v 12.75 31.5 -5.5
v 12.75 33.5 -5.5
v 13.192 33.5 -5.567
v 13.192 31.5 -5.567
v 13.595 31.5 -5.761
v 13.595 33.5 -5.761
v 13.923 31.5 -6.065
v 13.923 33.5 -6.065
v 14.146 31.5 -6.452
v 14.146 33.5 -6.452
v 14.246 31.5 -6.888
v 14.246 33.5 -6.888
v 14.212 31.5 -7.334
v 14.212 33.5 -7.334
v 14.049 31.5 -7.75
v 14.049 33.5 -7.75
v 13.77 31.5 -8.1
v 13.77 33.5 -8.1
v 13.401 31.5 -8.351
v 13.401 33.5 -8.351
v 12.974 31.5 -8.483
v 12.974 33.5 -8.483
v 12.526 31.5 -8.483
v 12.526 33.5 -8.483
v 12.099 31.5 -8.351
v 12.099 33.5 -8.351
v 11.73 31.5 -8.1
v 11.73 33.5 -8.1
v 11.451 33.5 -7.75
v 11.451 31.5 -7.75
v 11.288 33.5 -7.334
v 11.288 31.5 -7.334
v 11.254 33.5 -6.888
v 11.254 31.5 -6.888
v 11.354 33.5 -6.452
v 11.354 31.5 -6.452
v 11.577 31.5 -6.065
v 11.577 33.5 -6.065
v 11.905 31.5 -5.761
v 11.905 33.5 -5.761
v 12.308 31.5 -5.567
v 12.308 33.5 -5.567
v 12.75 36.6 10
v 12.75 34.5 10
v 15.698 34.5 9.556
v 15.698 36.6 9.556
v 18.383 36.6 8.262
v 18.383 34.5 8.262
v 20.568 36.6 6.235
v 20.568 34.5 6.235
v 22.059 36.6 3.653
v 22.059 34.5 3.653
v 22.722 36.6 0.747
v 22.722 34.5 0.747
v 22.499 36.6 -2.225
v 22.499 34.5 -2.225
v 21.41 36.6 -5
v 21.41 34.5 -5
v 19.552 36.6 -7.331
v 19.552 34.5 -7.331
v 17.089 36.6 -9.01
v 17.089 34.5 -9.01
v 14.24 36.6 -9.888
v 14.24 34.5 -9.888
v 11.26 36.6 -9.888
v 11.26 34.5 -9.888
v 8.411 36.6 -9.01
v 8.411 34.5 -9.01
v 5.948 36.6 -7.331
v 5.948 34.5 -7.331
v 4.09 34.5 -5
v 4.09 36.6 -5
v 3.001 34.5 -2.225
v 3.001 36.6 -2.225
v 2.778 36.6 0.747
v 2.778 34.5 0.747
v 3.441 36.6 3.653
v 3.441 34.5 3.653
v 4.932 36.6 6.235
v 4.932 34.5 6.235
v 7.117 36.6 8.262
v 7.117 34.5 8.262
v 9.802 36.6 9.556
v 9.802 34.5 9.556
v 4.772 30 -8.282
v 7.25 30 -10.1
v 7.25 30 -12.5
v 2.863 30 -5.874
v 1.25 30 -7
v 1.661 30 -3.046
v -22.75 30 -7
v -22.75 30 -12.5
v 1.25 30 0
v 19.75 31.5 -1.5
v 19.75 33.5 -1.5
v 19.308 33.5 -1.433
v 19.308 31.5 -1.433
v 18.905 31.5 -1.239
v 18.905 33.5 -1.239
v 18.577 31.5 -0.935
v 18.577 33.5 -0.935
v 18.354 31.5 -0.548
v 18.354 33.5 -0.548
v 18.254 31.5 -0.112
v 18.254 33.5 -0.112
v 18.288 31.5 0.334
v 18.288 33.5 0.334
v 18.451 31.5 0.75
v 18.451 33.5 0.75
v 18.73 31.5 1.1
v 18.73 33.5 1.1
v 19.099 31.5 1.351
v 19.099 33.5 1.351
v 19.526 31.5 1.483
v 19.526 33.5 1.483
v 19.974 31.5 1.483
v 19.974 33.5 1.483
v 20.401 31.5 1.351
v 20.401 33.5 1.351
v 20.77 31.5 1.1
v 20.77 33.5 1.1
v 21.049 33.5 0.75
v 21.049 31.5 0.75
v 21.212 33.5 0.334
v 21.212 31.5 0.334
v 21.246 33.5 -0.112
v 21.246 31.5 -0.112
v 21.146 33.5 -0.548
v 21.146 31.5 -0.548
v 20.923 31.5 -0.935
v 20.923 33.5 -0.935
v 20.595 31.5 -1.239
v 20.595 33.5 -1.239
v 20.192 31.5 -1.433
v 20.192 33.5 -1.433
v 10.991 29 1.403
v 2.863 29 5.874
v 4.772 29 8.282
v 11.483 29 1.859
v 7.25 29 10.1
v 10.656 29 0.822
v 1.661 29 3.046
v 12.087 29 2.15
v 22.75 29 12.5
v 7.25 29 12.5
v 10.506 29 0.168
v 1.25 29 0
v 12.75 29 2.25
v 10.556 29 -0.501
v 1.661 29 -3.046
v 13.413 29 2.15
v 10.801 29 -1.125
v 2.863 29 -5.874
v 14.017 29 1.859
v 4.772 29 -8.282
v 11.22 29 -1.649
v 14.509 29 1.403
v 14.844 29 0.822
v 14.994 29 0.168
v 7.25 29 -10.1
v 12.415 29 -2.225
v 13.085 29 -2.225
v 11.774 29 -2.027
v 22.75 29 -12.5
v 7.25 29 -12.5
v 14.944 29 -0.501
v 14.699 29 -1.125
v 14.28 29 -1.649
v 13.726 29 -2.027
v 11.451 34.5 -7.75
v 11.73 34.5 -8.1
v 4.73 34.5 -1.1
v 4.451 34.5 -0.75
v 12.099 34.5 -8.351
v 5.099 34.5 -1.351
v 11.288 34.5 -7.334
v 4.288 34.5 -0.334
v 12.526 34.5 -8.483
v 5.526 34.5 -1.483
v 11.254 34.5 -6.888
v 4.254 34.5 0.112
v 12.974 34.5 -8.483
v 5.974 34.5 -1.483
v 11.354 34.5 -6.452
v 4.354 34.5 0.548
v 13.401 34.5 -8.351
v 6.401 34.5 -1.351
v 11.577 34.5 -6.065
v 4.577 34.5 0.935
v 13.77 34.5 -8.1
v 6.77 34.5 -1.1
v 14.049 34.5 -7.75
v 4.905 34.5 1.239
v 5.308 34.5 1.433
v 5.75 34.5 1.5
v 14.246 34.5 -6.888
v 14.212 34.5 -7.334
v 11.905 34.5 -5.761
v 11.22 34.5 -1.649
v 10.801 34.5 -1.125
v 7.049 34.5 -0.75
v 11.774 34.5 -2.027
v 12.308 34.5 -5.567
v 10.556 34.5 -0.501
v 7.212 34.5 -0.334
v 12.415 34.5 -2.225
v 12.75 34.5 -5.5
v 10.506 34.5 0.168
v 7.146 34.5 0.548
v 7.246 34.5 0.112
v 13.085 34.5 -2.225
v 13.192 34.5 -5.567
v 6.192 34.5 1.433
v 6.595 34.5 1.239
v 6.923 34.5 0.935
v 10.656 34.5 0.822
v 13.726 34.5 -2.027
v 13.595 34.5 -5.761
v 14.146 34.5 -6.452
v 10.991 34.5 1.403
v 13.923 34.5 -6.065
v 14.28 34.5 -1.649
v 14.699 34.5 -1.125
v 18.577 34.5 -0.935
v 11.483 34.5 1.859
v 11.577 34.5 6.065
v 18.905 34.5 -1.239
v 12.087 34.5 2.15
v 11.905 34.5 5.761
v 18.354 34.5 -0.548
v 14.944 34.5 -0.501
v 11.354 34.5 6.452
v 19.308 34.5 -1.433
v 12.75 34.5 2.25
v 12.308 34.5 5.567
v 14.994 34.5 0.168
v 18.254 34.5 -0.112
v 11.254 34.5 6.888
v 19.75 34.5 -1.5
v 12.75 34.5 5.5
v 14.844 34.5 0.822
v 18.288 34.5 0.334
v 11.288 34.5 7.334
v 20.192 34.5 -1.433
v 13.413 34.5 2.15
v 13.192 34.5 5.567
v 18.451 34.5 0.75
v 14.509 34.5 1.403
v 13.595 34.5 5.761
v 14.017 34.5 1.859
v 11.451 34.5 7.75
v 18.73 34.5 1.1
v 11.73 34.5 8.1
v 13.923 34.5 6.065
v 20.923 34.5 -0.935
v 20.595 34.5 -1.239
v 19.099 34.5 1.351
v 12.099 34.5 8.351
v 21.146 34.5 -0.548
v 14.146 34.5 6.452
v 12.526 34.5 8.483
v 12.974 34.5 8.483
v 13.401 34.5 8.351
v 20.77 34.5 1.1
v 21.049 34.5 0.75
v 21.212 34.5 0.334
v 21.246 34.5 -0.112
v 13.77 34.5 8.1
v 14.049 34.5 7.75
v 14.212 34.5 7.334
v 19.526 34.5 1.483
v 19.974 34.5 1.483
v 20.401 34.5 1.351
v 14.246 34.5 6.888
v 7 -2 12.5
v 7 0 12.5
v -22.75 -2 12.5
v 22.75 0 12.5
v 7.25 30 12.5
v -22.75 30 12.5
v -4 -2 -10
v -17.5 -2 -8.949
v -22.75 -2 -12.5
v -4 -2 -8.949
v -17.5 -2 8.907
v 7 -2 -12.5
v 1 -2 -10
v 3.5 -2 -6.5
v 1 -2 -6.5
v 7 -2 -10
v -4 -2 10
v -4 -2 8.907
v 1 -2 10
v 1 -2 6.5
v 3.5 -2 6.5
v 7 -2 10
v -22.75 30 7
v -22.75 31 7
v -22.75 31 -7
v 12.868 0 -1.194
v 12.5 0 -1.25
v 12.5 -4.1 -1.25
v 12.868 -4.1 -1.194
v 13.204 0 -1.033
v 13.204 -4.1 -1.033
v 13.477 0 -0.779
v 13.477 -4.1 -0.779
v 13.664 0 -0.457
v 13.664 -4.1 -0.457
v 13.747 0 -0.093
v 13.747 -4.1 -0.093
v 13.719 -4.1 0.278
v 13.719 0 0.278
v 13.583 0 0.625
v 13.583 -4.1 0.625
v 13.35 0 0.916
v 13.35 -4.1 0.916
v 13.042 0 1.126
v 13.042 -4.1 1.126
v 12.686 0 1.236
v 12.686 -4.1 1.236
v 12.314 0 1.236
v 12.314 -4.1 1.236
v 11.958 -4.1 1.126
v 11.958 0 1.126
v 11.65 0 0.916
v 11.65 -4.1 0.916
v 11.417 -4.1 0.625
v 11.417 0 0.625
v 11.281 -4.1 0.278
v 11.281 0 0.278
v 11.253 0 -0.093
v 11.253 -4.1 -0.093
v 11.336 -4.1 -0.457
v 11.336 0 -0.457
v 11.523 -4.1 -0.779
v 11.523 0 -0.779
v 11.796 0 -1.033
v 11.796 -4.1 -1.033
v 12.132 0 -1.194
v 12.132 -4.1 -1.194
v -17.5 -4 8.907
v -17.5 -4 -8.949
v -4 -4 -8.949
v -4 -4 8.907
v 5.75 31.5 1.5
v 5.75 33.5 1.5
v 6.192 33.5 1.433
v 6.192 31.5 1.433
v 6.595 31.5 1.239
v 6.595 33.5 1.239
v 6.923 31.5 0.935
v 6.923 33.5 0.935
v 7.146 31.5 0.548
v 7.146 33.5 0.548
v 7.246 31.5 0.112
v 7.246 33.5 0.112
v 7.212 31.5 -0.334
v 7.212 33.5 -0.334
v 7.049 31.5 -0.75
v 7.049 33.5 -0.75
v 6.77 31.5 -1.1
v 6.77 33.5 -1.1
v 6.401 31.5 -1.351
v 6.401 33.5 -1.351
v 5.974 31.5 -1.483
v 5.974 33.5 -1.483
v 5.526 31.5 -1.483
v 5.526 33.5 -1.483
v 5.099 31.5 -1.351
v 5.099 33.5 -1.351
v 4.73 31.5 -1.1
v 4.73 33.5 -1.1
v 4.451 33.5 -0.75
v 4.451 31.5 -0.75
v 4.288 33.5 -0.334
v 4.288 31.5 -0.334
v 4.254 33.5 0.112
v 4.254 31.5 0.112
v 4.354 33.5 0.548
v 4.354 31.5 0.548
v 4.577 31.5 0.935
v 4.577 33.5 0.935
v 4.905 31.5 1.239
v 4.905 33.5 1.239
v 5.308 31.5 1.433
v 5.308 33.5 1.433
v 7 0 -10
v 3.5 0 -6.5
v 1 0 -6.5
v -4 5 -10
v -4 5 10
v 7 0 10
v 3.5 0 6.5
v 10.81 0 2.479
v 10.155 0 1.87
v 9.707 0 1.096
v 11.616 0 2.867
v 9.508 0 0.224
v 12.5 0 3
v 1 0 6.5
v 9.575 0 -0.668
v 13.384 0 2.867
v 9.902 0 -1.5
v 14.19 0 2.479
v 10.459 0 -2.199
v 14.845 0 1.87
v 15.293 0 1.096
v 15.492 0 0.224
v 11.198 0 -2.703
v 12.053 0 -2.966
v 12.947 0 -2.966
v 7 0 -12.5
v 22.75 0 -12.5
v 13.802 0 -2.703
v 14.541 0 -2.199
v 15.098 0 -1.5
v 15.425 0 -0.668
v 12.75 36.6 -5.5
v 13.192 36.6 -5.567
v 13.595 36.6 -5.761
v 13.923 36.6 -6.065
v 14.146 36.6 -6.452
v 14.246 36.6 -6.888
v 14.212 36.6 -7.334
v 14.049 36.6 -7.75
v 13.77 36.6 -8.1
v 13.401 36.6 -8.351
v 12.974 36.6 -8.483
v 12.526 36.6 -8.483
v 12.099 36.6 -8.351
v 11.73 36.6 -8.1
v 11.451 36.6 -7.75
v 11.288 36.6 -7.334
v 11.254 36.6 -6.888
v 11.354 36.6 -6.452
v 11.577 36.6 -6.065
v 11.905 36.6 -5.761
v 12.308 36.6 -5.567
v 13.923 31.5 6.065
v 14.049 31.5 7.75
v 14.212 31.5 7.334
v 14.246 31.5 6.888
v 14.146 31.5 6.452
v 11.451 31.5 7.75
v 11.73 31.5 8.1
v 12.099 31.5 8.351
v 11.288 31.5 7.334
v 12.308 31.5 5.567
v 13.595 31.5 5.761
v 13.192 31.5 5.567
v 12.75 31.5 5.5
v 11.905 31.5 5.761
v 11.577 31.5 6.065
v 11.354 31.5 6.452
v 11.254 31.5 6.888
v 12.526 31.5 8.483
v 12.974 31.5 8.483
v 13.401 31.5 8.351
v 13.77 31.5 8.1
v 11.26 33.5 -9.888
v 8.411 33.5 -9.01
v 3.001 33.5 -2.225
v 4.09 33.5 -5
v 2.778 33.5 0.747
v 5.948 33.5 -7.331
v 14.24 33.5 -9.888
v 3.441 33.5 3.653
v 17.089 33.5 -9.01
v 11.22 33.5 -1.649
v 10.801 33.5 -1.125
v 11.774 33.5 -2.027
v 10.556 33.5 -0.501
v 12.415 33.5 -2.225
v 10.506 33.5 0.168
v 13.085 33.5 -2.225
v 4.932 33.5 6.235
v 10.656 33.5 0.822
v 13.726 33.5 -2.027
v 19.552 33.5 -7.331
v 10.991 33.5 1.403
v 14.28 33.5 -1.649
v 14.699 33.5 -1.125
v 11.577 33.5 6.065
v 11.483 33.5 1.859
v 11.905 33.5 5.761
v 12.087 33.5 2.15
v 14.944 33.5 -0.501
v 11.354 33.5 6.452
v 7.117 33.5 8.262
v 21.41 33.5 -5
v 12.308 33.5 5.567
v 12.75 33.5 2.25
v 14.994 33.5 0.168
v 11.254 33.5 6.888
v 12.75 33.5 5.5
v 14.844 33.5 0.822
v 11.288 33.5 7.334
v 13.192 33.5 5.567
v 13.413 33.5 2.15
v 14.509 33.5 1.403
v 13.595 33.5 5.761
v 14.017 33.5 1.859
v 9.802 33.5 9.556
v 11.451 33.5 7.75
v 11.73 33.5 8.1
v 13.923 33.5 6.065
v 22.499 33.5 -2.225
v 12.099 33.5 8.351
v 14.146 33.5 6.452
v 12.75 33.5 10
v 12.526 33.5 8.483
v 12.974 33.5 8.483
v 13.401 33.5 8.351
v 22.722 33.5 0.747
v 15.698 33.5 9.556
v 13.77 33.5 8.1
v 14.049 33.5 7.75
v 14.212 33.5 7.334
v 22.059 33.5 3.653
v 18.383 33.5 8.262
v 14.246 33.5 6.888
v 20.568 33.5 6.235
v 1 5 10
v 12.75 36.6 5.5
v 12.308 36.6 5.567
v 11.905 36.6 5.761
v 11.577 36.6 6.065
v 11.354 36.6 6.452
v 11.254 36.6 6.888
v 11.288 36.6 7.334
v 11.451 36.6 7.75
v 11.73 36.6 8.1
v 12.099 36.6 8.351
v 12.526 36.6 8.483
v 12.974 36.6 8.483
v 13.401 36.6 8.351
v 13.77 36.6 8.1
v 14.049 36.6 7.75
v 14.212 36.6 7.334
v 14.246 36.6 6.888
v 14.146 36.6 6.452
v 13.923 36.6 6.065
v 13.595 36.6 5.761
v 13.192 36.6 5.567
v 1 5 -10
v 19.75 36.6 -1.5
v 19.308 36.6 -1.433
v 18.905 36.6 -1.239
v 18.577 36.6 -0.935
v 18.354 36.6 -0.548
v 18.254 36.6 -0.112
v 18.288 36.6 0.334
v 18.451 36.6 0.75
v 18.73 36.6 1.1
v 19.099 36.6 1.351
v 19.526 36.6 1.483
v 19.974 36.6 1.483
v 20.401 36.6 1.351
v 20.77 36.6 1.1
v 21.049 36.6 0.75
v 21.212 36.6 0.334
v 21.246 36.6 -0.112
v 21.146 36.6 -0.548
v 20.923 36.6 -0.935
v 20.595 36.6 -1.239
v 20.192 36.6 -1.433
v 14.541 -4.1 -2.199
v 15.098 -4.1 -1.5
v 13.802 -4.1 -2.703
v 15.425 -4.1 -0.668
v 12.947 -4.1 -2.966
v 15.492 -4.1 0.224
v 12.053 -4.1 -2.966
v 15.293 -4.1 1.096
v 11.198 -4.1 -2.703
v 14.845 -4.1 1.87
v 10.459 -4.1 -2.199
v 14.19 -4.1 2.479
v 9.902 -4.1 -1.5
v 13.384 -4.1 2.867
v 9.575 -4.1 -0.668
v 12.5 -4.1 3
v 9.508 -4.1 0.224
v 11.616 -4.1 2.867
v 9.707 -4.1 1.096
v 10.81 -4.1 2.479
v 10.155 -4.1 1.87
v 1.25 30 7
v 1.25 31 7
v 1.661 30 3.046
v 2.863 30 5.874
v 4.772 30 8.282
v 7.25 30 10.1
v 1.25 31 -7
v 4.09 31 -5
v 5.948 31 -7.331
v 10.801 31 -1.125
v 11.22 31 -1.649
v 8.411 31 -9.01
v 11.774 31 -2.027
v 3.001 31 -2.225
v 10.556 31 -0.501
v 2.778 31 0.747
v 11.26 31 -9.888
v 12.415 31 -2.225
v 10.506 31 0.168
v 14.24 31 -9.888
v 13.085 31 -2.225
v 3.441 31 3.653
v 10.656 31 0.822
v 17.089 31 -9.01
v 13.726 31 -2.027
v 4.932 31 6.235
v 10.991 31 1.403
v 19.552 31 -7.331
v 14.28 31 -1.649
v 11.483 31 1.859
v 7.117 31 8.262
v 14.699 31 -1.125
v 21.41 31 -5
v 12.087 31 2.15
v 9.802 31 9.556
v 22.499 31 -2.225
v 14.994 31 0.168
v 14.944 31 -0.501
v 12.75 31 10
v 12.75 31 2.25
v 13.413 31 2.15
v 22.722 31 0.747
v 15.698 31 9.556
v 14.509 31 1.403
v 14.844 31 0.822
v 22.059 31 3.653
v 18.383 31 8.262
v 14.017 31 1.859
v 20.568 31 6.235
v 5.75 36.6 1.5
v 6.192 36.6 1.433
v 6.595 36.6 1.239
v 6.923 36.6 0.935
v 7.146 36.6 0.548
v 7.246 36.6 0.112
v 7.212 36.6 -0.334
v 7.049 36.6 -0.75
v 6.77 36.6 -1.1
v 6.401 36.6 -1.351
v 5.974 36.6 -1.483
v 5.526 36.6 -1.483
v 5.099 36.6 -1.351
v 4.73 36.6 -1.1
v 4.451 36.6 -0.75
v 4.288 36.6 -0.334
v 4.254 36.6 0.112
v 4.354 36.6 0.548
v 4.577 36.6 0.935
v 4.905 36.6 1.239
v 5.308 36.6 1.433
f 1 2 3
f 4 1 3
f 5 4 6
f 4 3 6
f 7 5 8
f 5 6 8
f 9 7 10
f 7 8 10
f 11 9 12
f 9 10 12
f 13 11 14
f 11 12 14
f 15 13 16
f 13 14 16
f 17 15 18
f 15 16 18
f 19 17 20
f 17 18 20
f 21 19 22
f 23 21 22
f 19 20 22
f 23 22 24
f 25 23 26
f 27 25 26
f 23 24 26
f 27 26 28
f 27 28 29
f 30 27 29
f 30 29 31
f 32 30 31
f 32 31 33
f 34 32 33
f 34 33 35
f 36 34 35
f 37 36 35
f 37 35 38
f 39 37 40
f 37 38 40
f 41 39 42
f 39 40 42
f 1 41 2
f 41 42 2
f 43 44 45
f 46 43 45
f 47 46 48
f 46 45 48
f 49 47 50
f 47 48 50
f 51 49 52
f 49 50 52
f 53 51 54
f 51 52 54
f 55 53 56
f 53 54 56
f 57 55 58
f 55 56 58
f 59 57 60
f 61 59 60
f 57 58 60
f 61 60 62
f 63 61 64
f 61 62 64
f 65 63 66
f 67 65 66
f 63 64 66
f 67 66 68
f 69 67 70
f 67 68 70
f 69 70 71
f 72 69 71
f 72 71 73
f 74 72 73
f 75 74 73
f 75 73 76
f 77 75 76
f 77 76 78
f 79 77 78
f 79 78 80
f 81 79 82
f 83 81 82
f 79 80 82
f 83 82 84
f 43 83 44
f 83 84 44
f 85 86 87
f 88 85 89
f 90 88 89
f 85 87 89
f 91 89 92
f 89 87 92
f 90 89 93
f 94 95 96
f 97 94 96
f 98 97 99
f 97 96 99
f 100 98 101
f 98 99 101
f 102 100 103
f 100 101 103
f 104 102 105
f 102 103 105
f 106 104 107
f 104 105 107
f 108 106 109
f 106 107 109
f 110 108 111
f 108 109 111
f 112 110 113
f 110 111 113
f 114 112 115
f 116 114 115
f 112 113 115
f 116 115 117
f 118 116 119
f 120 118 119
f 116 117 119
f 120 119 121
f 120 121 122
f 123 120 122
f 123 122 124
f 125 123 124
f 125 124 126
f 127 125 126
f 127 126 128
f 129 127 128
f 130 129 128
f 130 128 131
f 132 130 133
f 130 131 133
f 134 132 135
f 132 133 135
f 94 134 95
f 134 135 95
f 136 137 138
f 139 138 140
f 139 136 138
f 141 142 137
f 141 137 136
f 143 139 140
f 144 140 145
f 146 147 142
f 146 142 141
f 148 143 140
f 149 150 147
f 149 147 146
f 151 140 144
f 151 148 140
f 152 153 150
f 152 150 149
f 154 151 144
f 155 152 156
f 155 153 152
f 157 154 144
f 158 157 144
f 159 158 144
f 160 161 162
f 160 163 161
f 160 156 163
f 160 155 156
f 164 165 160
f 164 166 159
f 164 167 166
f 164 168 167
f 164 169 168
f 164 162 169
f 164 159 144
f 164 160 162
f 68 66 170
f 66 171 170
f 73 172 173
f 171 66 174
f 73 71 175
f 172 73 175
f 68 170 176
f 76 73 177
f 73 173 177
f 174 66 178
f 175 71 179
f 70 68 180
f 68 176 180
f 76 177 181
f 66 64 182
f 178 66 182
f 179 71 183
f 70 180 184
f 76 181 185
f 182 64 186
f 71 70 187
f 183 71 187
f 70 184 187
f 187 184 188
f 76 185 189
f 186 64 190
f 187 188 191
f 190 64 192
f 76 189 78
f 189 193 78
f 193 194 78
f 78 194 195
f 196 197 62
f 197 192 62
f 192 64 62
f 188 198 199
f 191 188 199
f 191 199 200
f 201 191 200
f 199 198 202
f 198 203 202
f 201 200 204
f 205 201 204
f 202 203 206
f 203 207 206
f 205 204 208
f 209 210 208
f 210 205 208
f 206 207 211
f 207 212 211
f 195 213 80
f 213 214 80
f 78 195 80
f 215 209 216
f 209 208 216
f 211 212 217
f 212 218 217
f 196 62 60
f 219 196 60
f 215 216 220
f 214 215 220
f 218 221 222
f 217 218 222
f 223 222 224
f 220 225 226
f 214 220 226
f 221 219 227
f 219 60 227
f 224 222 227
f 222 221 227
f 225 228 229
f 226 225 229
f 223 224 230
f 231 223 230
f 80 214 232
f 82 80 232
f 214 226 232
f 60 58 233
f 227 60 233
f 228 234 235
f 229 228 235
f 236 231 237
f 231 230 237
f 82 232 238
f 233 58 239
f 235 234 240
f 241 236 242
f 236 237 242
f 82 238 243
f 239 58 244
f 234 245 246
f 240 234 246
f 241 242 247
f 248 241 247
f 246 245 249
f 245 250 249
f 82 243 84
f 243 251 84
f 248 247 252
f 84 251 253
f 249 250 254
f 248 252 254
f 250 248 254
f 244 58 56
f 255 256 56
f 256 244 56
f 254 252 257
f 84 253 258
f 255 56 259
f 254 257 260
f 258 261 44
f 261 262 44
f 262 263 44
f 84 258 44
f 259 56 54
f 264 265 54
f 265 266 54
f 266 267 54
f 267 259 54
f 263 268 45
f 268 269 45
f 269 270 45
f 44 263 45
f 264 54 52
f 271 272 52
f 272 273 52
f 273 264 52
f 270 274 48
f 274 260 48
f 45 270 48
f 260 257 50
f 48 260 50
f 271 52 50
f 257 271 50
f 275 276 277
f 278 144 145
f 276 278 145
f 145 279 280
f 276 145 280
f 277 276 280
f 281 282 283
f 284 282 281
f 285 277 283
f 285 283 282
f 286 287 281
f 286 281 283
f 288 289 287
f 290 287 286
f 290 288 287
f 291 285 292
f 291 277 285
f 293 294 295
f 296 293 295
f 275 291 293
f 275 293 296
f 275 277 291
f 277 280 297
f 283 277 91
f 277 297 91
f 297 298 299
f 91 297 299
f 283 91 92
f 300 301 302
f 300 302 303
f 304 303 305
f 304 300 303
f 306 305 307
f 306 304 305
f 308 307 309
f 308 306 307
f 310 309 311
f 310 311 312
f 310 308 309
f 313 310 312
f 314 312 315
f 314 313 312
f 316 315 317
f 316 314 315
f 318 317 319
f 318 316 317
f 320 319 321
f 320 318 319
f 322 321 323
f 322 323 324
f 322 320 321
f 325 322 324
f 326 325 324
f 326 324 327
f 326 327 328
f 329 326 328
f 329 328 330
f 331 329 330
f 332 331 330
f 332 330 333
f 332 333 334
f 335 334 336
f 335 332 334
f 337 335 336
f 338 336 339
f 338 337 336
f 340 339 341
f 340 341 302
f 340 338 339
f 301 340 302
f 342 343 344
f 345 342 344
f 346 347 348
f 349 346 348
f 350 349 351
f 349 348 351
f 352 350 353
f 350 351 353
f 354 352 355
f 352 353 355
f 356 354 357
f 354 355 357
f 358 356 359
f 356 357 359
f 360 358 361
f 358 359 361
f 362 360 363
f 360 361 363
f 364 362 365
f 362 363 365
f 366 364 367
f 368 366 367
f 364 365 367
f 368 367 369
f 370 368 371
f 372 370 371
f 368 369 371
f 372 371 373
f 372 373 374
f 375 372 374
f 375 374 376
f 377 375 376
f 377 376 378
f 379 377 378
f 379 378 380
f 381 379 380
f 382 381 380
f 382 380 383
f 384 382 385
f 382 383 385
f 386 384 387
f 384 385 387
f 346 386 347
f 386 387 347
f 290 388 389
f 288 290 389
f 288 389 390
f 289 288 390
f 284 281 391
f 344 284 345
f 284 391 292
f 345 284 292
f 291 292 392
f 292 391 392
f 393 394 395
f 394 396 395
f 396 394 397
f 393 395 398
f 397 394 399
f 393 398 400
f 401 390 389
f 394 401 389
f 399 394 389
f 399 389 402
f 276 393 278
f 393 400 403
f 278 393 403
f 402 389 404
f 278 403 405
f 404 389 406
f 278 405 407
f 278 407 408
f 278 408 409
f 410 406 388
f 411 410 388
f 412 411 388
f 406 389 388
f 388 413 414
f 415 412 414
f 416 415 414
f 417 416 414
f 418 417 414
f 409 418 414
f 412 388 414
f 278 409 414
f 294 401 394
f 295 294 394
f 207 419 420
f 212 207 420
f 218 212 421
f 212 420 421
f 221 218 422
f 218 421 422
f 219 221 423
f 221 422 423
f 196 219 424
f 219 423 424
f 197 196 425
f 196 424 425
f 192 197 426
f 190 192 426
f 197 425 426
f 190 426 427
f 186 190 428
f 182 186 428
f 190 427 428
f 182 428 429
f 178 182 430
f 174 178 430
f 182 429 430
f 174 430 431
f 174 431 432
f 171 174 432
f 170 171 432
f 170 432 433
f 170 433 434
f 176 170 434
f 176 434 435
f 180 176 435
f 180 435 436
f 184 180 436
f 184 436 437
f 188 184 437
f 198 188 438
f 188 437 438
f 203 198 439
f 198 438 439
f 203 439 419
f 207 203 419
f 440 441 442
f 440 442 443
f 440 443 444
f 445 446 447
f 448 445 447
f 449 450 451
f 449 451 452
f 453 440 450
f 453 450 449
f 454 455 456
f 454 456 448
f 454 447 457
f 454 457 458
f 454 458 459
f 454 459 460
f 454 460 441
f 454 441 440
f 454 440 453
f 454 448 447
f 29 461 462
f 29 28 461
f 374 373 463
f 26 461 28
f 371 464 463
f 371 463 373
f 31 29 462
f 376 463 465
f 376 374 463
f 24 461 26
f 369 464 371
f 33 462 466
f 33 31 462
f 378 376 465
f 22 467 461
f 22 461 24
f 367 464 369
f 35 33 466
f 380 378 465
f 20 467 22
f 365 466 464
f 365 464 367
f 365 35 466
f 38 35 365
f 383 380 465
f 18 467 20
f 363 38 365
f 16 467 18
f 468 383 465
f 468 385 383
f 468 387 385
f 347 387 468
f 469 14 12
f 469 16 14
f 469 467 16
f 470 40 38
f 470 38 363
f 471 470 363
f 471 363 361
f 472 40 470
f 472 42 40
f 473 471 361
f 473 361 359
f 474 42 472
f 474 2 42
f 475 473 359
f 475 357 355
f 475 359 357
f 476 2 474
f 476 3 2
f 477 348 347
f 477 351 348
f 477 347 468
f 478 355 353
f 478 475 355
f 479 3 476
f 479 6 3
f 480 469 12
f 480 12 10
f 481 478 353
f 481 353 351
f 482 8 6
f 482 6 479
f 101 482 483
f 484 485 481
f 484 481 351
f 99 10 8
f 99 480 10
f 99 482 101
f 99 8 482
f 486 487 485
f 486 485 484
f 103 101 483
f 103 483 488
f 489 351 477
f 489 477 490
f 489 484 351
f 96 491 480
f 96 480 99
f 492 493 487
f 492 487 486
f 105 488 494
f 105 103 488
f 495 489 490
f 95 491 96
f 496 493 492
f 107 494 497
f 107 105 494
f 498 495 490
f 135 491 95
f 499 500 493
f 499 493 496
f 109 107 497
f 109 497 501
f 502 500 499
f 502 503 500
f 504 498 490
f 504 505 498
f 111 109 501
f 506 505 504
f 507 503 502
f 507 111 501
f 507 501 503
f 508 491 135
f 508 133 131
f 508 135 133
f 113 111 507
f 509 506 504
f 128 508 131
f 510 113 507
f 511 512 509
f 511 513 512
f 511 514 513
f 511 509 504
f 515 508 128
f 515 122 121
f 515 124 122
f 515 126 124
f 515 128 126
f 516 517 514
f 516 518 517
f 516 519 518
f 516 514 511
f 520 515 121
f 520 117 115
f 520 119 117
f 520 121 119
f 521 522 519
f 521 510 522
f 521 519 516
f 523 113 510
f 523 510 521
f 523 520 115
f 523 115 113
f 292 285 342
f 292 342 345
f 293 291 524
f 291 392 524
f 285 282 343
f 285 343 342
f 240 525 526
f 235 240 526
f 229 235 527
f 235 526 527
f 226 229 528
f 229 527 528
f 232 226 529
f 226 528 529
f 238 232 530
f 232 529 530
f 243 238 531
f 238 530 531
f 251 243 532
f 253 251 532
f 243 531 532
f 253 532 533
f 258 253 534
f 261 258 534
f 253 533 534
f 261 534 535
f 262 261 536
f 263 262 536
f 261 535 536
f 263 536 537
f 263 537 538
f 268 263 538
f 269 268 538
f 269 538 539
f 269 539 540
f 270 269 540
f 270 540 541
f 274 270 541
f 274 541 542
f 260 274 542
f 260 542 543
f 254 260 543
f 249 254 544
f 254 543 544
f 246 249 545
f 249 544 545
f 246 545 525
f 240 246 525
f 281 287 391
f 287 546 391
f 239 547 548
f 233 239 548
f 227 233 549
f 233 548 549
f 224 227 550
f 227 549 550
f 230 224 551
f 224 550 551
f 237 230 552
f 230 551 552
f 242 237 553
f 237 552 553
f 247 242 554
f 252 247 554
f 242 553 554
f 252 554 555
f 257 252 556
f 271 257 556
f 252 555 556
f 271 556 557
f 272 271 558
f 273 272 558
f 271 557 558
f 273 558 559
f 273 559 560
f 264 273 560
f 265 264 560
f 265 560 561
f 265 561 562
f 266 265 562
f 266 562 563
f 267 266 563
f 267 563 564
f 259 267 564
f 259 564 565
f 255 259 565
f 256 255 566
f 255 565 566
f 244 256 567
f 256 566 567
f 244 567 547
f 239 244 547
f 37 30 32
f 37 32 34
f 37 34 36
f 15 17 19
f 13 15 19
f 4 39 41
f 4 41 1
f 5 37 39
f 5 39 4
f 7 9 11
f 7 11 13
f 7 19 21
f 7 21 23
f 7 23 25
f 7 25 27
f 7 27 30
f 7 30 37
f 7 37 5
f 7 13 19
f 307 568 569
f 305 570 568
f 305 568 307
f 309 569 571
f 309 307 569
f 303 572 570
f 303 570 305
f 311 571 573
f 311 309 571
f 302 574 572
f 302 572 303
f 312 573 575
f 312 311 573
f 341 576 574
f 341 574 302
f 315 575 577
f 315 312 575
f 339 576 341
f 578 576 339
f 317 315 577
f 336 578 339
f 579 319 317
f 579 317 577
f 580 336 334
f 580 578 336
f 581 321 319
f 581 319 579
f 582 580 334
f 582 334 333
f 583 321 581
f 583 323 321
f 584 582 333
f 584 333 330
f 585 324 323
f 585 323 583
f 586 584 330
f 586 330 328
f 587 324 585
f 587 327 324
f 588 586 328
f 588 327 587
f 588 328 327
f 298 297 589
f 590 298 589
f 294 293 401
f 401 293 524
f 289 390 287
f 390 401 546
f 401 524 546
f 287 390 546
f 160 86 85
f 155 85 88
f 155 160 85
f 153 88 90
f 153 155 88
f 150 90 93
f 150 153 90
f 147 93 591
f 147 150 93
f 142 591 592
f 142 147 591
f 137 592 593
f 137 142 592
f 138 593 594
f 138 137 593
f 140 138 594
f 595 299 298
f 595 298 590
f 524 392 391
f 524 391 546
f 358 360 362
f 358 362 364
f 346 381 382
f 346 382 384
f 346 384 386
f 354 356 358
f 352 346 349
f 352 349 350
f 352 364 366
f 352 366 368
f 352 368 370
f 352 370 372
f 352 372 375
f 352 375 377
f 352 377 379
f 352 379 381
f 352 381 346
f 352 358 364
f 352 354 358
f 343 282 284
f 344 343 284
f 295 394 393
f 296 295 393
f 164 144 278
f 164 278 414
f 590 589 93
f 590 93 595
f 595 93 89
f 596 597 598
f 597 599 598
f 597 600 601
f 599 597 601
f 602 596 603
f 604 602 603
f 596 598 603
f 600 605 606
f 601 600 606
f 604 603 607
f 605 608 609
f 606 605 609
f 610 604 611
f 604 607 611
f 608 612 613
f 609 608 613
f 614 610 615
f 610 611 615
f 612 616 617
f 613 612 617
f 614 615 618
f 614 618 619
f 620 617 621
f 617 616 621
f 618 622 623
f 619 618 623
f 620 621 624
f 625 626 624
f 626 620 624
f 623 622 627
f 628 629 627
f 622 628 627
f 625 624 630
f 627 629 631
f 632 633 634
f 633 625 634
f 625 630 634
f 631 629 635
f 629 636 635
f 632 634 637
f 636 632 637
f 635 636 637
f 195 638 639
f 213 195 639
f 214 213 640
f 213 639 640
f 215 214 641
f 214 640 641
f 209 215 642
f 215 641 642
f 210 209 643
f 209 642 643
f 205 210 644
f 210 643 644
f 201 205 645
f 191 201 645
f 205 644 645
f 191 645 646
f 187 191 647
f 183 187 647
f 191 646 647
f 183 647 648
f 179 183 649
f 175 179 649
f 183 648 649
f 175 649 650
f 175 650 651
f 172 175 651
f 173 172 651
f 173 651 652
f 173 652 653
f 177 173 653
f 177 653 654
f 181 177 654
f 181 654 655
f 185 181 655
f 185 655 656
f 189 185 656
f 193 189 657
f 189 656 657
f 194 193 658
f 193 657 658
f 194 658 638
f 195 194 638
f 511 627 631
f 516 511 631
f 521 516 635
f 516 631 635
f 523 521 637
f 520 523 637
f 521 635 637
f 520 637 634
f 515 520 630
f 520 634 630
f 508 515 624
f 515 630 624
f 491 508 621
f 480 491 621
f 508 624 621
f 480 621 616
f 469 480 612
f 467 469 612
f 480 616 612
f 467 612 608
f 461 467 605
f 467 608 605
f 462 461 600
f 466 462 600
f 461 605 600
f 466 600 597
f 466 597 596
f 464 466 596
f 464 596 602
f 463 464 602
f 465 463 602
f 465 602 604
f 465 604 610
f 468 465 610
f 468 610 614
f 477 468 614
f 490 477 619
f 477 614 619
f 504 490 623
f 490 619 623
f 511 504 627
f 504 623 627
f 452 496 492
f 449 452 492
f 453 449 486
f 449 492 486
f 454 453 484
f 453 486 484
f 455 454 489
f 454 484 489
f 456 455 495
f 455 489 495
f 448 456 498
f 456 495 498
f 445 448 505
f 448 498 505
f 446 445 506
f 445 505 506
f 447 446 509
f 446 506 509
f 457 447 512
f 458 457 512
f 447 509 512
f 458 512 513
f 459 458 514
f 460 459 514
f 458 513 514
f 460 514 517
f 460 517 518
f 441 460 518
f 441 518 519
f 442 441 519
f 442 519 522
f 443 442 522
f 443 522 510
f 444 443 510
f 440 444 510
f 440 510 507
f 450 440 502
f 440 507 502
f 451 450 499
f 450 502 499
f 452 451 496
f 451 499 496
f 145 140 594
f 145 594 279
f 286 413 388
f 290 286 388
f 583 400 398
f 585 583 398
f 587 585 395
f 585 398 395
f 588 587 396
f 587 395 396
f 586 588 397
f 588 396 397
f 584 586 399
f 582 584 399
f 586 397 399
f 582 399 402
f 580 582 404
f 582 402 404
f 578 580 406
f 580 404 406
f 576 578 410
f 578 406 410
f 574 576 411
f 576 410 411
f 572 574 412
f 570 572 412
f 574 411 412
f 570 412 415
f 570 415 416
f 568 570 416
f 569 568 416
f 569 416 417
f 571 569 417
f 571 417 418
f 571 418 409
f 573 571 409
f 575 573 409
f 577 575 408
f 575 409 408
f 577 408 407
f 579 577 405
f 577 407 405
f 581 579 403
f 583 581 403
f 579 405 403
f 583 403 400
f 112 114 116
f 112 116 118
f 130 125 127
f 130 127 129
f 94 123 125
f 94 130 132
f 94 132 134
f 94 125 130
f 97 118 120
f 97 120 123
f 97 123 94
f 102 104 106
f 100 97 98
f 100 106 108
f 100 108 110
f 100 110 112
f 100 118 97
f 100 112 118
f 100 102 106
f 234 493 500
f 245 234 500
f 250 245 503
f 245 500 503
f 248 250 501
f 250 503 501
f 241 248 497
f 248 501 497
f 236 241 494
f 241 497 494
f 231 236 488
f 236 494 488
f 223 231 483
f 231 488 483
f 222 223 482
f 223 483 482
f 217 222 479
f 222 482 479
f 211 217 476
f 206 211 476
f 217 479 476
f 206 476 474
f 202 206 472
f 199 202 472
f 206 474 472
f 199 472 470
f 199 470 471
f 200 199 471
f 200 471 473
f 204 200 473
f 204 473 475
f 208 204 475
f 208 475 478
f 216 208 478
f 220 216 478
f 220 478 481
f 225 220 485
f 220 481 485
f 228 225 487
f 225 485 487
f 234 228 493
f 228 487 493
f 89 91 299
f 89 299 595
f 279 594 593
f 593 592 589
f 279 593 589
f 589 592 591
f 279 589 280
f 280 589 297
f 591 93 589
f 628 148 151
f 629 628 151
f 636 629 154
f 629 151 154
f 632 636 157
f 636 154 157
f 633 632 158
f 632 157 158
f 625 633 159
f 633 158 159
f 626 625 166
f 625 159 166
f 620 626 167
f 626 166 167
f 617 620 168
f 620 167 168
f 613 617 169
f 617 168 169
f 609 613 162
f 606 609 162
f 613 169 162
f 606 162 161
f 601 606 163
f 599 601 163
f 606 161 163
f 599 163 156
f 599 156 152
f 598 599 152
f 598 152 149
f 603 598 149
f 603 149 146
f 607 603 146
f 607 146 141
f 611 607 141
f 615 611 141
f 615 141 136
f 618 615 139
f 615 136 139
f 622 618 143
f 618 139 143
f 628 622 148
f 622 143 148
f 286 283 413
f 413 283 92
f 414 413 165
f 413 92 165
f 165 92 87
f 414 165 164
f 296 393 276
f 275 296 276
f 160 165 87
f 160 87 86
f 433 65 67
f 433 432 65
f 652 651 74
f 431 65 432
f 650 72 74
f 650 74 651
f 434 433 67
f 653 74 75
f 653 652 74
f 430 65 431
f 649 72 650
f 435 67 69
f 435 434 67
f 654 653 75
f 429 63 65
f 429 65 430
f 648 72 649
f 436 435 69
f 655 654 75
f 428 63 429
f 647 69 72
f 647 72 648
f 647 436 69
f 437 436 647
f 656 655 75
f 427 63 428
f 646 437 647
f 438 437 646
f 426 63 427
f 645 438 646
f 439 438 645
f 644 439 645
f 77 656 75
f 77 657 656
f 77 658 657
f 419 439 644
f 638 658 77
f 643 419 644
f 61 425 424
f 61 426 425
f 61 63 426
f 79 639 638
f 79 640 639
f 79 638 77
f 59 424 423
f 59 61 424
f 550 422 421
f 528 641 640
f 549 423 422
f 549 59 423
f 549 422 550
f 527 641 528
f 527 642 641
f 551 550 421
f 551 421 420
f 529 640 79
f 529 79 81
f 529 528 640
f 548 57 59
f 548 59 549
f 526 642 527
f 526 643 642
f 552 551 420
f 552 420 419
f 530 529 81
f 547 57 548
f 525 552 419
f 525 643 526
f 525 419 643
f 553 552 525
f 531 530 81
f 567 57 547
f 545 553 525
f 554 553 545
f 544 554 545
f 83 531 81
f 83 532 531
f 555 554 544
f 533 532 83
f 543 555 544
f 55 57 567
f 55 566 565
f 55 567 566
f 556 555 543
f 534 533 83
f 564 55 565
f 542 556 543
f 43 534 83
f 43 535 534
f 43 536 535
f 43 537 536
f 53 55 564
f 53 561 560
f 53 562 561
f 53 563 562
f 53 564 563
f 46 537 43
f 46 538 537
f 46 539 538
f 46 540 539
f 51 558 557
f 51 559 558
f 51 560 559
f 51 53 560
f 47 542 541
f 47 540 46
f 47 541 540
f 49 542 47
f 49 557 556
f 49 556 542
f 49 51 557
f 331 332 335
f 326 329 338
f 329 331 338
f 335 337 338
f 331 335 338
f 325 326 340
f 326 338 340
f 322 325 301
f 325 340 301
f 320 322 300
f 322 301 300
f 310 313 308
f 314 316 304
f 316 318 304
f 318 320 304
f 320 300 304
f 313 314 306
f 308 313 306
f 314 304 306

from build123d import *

# Parameters (mm, degrees)
MAIN_BODY_SKETCH_W        = 45.5
MAIN_BODY_SKETCH_H        = 25
MAIN_BODY_EXTRUSION_DEPTH = 29
BOSS_EXTRUDE3_DEPTH       = 1
SKETCH8_W                 = 24
SKETCH8_H                 = 14
BOSS_EXTRUDE8_DEPTH       = 1
SKETCH3_R                 = 2.25
BOSS_EXTRUDE4_DEPTH       = 2
SKETCH6_R                 = 10
BOSS_EXTRUDE7_DEPTH       = 2.5
SKETCH7_R                 = 1.5
CUT_EXTRUDE1_DEPTH        = 2
SKETCH10_R                = 2.25
BOSS_EXTRUDE12_DEPTH      = 1
SKETCH11_R                = 10
BOSS_EXTRUDE13_DEPTH      = 2.1
SKETCH13_R                = 1.5
CUT_EXTRUDE3_DEPTH        = 2.1
BOSS_EXTRUDE9_DEPTH       = 2
SKETCH9_W                 = 5
SKETCH9_H                 = 20
CUT_EXTRUDE2_DEPTH        = 5
SKETCH4_R                 = 3
SKETCH4_R_2               = 1.25
BOSS_EXTRUDE10_DEPTH      = 4.1
SKETCH14_W                = 13.5
SKETCH14_H                = 17.856103011
BOSS_EXTRUDE14_DEPTH      = 2


with BuildPart() as part:
    # Main Body Sketch → Main Body Extrusion (new body)
    with BuildSketch(Plane(origin=(0, 0, 0), x_dir=(1, 0, 0), z_dir=(0, 1, 0))):
        Rectangle(MAIN_BODY_SKETCH_W, MAIN_BODY_SKETCH_H)
    extrude(amount=MAIN_BODY_EXTRUSION_DEPTH)

    # Sketch2 → Boss-Extrude3 (add)
    with BuildSketch(Plane(origin=(0, 29, 0), x_dir=(1, 0, 0), z_dir=(0, 1, 0))):
        with BuildLine():
            Line((-22.75, 12.5), (7.25, 12.5))
            Line((7.25, 12.5), (7.25, 10.099504938))
            ThreePointArc((7.25, 10.099504938), (1.25, 0), (7.25, -10.099504938))
            Line((7.25, -10.099504938), (7.25, -12.5))
            Line((7.25, -12.5), (-22.75, -12.5))
            Line((-22.75, -12.5), (-22.75, 12.5))
        make_face()
    extrude(amount=BOSS_EXTRUDE3_DEPTH)

    # Sketch8 → Boss-Extrude8 (add)
    with BuildSketch(Plane(origin=(0, 30, 0), x_dir=(1, 0, 0), z_dir=(0, 1, 0))):
        with Locations((-10.75, 0)):
            Rectangle(SKETCH8_W, SKETCH8_H)
    extrude(amount=BOSS_EXTRUDE8_DEPTH)

    # Sketch3 → Boss-Extrude4 (add)
    with BuildSketch(Plane(origin=(0, 29, 0), x_dir=(1, 0, 0), z_dir=(0, 1, 0))):
        with Locations(Location((12.75, 0, 0), (0, 0, 270))):
            Circle(SKETCH3_R)
    extrude(amount=BOSS_EXTRUDE4_DEPTH)

    # Sketch6 → Boss-Extrude7 (add)
    with BuildSketch(Plane(origin=(0, 31, 0), x_dir=(1, 0, 0), z_dir=(0, 1, 0))):
        with Locations(Location((12.75, 0, 0), (0, 0, 270))):
            Circle(SKETCH6_R)
    extrude(amount=BOSS_EXTRUDE7_DEPTH)

    # Sketch7 → Cut-Extrude1 (cut)
    with BuildSketch(Plane(origin=(0, 33.5, 0), x_dir=(1, 0, 0), z_dir=(0, 1, 0))):
        with Locations(Location((12.75, 7, 0), (0, 0, 270))):
            Circle(SKETCH7_R)
        with Locations(Location((12.75, -7, 0), (0, 0, 90))):
            Circle(SKETCH7_R)
        with Locations(Location((5.75, 0, 0), (0, 0, 270))):
            Circle(SKETCH7_R)
        with Locations(Location((19.75, 0, 0), (0, 0, 90))):
            Circle(SKETCH7_R)
    extrude(amount=-CUT_EXTRUDE1_DEPTH, mode=Mode.SUBTRACT)

    # Sketch10 → Boss-Extrude12 (add)
    with BuildSketch(Plane(origin=(0, 33.5, 0), x_dir=(1, 0, 0), z_dir=(0, 1, 0))):
        with Locations(Location((12.75, 0, 0), (0, 0, 270))):
            Circle(SKETCH10_R)
    extrude(amount=BOSS_EXTRUDE12_DEPTH)

    # Sketch11 → Boss-Extrude13 (add)
    with BuildSketch(Plane(origin=(0, 34.5, 0), x_dir=(1, 0, 0), z_dir=(0, 1, 0))):
        with Locations(Location((12.75, 0, 0), (0, 0, 270))):
            Circle(SKETCH11_R)
    extrude(amount=BOSS_EXTRUDE13_DEPTH)

    # Sketch13 → Cut-Extrude3 (cut)
    with BuildSketch(Plane(origin=(0, 36.6, 0), x_dir=(1, 0, 0), z_dir=(0, 1, 0))):
        with Locations(Location((12.75, 7, 0), (0, 0, 270))):
            Circle(SKETCH13_R)
        with Locations(Location((5.75, 0, 0), (0, 0, 270))):
            Circle(SKETCH13_R)
        with Locations(Location((12.75, -7, 0), (0, 0, 90))):
            Circle(SKETCH13_R)
        with Locations(Location((19.75, 0, 0), (0, 0, 90))):
            Circle(SKETCH13_R)
    extrude(amount=-CUT_EXTRUDE3_DEPTH, mode=Mode.SUBTRACT)

    # Sketch5 → Boss-Extrude9 (add)
    with BuildSketch(Plane.XZ):
        Polygon((-4, 12.5), (-22.75, 12.5), (-22.75, -12.5), (-4, -12.5), (-4, -10), (-4, 0), (-4, 10), align=None)
        Polygon((7, 12.5), (-4, 12.5), (-4, 10), (1, 10), (1, 6.5), (3.5, 6.5), (7, 10), align=None)
        Polygon((-4, -10), (-4, -12.5), (7, -12.5), (7, -10), (3.5, -6.5), (1, -6.5), (1, -10), align=None)
    extrude(amount=BOSS_EXTRUDE9_DEPTH)

    # Sketch9 → Cut-Extrude2 (cut)
    with BuildSketch(Plane.XZ):
        with Locations((-1.5, 0)):
            Rectangle(SKETCH9_W, SKETCH9_H)
    extrude(amount=-CUT_EXTRUDE2_DEPTH, mode=Mode.SUBTRACT)

    # Sketch4 → Boss-Extrude10 (add)
    with BuildSketch(Plane.XZ):
        with Locations(Location((12.5, 0, 0), (0, 0, 90))):
            Circle(SKETCH4_R)
        with Locations(Location((12.5, 0, 0), (0, 0, 270))):
            Circle(SKETCH4_R_2, mode=Mode.SUBTRACT)
    extrude(amount=BOSS_EXTRUDE10_DEPTH)

    # Sketch14 → Boss-Extrude14 (add)
    with BuildSketch(Plane.XZ.offset(2)):
        with Locations((-10.75, -0.020714737)):
            Rectangle(SKETCH14_W, SKETCH14_H)
    extrude(amount=BOSS_EXTRUDE14_DEPTH)


solid = part.part
